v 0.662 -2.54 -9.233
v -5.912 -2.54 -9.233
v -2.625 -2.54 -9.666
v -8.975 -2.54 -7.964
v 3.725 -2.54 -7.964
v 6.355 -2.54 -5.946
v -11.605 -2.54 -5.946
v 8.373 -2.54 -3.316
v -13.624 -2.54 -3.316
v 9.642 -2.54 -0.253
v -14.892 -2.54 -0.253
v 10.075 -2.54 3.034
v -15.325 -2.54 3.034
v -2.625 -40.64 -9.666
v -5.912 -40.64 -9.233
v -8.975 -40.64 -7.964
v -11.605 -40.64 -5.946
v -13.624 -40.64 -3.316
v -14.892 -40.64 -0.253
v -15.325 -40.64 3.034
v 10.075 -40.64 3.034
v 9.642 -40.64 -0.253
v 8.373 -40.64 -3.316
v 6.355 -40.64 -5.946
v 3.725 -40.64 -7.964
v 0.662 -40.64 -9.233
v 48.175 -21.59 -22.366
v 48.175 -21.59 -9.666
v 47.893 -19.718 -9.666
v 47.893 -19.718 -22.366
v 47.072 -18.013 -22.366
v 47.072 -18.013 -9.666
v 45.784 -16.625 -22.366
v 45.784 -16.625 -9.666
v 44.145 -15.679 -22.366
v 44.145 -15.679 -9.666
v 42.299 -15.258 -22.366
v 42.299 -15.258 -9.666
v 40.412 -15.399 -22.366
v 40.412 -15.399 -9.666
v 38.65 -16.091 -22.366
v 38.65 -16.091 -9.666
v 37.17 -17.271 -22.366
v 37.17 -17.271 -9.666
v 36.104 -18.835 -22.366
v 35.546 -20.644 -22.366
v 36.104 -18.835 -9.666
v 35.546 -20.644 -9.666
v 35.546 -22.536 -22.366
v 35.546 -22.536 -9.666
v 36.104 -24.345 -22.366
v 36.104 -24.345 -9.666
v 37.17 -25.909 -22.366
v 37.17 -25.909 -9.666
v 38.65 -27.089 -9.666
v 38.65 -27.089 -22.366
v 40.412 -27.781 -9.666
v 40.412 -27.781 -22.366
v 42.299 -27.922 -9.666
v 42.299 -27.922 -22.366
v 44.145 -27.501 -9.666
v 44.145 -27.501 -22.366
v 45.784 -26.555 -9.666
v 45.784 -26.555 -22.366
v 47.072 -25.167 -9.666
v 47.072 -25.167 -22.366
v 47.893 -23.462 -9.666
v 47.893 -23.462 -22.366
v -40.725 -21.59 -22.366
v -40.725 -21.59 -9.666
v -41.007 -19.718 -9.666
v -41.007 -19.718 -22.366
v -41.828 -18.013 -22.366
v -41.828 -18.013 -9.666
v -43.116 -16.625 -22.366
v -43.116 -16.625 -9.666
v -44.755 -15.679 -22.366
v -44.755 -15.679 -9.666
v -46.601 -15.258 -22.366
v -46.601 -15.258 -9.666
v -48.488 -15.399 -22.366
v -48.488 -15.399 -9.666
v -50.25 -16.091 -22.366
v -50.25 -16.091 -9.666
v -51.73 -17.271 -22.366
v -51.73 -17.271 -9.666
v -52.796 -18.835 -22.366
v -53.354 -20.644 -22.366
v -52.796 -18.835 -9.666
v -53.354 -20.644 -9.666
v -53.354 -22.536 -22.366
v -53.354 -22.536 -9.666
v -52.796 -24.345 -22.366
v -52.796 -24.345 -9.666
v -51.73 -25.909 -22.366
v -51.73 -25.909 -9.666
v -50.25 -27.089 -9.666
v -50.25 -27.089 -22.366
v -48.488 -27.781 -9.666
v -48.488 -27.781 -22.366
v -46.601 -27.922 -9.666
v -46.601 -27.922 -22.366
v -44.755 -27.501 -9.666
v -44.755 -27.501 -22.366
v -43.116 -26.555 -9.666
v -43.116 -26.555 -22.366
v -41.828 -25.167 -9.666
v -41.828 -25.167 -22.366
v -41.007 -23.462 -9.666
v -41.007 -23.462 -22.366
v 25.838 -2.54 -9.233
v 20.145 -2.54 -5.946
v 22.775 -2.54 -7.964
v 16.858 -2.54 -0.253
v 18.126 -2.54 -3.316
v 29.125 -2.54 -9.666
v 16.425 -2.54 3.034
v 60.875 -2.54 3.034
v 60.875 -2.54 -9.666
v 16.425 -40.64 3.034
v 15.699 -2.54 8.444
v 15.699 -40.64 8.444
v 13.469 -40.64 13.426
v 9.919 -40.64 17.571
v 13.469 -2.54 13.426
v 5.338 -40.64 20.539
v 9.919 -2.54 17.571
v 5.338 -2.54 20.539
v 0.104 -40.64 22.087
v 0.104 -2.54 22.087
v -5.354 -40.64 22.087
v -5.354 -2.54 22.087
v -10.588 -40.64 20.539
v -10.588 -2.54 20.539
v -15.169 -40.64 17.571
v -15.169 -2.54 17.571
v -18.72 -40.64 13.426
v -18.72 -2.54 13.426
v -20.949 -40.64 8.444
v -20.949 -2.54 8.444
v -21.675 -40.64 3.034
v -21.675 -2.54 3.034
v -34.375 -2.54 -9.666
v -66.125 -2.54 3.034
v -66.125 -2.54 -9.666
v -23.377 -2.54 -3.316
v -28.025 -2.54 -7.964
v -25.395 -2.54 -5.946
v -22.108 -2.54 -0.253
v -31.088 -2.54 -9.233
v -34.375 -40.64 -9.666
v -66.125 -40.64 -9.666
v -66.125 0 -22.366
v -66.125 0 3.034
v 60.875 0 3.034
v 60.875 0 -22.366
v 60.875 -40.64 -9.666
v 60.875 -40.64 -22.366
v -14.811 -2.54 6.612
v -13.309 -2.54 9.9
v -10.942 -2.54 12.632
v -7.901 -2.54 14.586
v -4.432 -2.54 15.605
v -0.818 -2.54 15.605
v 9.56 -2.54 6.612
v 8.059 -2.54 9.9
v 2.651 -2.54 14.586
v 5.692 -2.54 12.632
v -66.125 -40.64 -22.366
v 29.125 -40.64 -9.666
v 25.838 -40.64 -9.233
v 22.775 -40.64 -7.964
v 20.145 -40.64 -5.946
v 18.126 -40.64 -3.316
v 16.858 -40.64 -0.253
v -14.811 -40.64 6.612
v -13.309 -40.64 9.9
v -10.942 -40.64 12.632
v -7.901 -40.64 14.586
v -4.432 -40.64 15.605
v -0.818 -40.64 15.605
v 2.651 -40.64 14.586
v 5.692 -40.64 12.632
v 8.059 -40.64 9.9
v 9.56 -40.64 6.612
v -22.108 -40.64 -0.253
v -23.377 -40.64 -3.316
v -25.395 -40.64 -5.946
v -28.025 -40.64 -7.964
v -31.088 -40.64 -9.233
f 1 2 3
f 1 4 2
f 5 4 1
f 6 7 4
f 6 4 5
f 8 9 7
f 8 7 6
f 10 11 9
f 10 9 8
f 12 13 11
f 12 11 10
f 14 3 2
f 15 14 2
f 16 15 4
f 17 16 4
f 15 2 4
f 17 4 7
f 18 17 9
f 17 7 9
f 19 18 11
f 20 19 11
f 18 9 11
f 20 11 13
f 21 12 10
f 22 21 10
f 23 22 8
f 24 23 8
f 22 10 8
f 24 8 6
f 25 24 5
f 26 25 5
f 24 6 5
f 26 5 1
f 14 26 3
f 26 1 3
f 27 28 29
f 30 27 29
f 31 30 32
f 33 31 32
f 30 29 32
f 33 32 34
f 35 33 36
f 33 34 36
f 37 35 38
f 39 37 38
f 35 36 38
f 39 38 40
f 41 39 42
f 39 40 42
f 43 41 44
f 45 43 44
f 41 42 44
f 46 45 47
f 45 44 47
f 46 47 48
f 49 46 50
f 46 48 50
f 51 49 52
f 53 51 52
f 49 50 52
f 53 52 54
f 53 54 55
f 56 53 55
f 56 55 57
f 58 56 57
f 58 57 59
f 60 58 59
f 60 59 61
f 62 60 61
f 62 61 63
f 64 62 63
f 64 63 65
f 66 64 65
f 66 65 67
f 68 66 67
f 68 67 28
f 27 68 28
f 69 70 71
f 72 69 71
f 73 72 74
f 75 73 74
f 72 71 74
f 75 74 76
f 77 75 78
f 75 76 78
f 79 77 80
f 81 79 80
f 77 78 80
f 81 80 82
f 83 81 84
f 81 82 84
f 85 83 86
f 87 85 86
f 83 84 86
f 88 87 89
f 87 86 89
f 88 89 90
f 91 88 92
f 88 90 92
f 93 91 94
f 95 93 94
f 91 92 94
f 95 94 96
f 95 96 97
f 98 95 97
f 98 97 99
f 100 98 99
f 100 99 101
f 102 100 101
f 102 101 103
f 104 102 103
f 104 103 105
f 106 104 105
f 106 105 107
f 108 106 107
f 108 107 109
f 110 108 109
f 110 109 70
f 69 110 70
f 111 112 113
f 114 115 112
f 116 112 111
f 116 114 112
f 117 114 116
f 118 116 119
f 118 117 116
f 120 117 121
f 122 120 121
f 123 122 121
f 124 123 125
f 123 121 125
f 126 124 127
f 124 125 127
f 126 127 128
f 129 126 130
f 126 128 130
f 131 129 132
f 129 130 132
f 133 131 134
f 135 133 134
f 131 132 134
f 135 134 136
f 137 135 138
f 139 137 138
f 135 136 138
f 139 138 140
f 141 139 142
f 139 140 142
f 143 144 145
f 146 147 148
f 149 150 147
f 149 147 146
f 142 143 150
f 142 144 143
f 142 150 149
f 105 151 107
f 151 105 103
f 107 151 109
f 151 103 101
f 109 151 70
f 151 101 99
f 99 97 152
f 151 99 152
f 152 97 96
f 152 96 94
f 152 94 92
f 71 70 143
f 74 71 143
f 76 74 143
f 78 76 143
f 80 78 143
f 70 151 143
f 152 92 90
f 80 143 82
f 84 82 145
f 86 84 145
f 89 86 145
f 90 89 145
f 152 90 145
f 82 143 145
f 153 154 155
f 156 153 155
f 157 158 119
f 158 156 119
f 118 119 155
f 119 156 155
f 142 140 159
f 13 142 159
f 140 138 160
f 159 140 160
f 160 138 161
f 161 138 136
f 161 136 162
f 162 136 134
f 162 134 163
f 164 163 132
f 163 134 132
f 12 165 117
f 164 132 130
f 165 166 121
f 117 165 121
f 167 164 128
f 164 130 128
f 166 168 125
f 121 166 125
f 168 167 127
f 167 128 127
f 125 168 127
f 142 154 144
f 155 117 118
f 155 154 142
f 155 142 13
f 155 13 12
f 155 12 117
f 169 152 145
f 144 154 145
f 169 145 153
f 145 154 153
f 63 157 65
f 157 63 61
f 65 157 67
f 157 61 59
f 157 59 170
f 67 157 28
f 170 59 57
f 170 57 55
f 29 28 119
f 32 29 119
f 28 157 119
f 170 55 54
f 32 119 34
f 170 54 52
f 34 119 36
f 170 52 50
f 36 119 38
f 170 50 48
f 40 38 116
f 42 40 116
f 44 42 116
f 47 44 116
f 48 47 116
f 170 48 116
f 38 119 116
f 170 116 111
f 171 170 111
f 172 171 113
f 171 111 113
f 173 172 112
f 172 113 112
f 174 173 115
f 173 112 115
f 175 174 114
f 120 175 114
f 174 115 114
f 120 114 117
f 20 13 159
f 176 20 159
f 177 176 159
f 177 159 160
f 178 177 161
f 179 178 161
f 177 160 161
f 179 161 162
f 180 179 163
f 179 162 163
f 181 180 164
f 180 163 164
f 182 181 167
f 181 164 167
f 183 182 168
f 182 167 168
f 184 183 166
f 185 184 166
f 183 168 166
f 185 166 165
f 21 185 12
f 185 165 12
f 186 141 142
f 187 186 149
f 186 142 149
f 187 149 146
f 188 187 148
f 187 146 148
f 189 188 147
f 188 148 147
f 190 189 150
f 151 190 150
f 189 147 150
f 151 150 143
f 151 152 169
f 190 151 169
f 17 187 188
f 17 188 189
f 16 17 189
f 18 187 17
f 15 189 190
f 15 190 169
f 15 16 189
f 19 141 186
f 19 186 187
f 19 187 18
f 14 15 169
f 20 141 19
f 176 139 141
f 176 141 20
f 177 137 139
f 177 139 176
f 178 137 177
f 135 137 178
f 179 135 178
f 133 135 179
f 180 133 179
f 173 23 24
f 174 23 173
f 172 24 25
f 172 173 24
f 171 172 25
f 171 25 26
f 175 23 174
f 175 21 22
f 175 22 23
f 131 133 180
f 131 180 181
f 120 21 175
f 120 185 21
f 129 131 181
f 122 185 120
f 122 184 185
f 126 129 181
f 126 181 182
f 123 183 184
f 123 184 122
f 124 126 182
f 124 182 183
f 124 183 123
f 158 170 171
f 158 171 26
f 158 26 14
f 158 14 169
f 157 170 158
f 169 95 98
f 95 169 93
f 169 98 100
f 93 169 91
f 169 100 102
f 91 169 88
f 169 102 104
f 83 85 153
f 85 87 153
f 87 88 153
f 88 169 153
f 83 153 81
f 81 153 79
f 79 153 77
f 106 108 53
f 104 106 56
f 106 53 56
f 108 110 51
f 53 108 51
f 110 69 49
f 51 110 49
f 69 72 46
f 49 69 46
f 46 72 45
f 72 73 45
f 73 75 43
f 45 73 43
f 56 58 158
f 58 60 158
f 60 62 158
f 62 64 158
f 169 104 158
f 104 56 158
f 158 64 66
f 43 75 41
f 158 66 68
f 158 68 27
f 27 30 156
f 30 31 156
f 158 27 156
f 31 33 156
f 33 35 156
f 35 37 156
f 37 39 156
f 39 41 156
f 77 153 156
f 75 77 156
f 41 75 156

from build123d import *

# Parameters (mm, degrees)
F0_W     = 127
F0_H     = 25.4
F1_DEPTH = 2.54
F3_DEPTH = 38.1
F4_R     = 6.35
F5_DEPTH = 25.4


with BuildPart() as f1:
    # F0 (on Front) → F1 (new body)
    with BuildSketch(Plane.XZ):
        with Locations((-2.625061, -9.665867)):
            Rectangle(F0_W, F0_H)
    extrude(amount=F1_DEPTH)

    # F2 (on face) → F3 (join)
    with BuildSketch(Plane.XZ.offset(2.54)):
        with BuildLine():
            Line((-43.24917, -9.665867), (-66.125061, -9.665867))
            Line((-66.125061, -9.665867), (-66.125061, -22.365867))
            Line((-66.125061, -22.365867), (-2.625061, -22.365867))
            Line((-2.625061, -22.365867), (-2.625061, -9.665867))
            ThreePointArc((-2.625061, -9.665867), (-11.605317, -5.946123), (-15.325061, 3.034133))
            Line((-15.325061, 3.034133), (-21.675061, 3.034133))
            ThreePointArc((-21.675061, 3.034133), (-25.394805, -5.946123), (-34.375061, -9.665867))
            Line((-34.375061, -9.665867), (-43.24917, -9.665867))
        make_face()
        with BuildLine():
            ThreePointArc((16.424939, 3.034133), (-2.625061, 22.283079), (-21.675061, 3.034133))
            Line((-21.675061, 3.034133), (-15.325061, 3.034133))
            ThreePointArc((-15.325061, 3.034133), (-2.625061, 15.734133), (10.074939, 3.034133))
            Line((10.074939, 3.034133), (16.424939, 3.034133))
        make_face()
        with BuildLine():
            Line((-2.625061, -9.665867), (-2.625061, -22.365867))
            Line((-2.625061, -22.365867), (60.874939, -22.365867))
            Line((60.874939, -22.365867), (60.874939, -9.665867))
            Line((60.874939, -9.665867), (37.999048, -9.665867))
            Line((37.999048, -9.665867), (29.124939, -9.665867))
            ThreePointArc((29.124939, -9.665867), (20.144683, -5.946123), (16.424939, 3.034133))
            Line((16.424939, 3.034133), (10.074939, 3.034133))
            ThreePointArc((10.074939, 3.034133), (6.355195, -5.946123), (-2.625061, -9.665867))
        make_face()
    extrude(amount=F3_DEPTH)

    # F4 (on face) → F5 (cut)
    with BuildSketch(Plane.XY.offset(-9.665867)):
        with Locations((41.824939, -21.59)):
            Circle(F4_R)
        with Locations((-47.075061, -21.59)):
            Circle(F4_R)
    extrude(amount=-F5_DEPTH, mode=Mode.SUBTRACT)


solid = f1.part
